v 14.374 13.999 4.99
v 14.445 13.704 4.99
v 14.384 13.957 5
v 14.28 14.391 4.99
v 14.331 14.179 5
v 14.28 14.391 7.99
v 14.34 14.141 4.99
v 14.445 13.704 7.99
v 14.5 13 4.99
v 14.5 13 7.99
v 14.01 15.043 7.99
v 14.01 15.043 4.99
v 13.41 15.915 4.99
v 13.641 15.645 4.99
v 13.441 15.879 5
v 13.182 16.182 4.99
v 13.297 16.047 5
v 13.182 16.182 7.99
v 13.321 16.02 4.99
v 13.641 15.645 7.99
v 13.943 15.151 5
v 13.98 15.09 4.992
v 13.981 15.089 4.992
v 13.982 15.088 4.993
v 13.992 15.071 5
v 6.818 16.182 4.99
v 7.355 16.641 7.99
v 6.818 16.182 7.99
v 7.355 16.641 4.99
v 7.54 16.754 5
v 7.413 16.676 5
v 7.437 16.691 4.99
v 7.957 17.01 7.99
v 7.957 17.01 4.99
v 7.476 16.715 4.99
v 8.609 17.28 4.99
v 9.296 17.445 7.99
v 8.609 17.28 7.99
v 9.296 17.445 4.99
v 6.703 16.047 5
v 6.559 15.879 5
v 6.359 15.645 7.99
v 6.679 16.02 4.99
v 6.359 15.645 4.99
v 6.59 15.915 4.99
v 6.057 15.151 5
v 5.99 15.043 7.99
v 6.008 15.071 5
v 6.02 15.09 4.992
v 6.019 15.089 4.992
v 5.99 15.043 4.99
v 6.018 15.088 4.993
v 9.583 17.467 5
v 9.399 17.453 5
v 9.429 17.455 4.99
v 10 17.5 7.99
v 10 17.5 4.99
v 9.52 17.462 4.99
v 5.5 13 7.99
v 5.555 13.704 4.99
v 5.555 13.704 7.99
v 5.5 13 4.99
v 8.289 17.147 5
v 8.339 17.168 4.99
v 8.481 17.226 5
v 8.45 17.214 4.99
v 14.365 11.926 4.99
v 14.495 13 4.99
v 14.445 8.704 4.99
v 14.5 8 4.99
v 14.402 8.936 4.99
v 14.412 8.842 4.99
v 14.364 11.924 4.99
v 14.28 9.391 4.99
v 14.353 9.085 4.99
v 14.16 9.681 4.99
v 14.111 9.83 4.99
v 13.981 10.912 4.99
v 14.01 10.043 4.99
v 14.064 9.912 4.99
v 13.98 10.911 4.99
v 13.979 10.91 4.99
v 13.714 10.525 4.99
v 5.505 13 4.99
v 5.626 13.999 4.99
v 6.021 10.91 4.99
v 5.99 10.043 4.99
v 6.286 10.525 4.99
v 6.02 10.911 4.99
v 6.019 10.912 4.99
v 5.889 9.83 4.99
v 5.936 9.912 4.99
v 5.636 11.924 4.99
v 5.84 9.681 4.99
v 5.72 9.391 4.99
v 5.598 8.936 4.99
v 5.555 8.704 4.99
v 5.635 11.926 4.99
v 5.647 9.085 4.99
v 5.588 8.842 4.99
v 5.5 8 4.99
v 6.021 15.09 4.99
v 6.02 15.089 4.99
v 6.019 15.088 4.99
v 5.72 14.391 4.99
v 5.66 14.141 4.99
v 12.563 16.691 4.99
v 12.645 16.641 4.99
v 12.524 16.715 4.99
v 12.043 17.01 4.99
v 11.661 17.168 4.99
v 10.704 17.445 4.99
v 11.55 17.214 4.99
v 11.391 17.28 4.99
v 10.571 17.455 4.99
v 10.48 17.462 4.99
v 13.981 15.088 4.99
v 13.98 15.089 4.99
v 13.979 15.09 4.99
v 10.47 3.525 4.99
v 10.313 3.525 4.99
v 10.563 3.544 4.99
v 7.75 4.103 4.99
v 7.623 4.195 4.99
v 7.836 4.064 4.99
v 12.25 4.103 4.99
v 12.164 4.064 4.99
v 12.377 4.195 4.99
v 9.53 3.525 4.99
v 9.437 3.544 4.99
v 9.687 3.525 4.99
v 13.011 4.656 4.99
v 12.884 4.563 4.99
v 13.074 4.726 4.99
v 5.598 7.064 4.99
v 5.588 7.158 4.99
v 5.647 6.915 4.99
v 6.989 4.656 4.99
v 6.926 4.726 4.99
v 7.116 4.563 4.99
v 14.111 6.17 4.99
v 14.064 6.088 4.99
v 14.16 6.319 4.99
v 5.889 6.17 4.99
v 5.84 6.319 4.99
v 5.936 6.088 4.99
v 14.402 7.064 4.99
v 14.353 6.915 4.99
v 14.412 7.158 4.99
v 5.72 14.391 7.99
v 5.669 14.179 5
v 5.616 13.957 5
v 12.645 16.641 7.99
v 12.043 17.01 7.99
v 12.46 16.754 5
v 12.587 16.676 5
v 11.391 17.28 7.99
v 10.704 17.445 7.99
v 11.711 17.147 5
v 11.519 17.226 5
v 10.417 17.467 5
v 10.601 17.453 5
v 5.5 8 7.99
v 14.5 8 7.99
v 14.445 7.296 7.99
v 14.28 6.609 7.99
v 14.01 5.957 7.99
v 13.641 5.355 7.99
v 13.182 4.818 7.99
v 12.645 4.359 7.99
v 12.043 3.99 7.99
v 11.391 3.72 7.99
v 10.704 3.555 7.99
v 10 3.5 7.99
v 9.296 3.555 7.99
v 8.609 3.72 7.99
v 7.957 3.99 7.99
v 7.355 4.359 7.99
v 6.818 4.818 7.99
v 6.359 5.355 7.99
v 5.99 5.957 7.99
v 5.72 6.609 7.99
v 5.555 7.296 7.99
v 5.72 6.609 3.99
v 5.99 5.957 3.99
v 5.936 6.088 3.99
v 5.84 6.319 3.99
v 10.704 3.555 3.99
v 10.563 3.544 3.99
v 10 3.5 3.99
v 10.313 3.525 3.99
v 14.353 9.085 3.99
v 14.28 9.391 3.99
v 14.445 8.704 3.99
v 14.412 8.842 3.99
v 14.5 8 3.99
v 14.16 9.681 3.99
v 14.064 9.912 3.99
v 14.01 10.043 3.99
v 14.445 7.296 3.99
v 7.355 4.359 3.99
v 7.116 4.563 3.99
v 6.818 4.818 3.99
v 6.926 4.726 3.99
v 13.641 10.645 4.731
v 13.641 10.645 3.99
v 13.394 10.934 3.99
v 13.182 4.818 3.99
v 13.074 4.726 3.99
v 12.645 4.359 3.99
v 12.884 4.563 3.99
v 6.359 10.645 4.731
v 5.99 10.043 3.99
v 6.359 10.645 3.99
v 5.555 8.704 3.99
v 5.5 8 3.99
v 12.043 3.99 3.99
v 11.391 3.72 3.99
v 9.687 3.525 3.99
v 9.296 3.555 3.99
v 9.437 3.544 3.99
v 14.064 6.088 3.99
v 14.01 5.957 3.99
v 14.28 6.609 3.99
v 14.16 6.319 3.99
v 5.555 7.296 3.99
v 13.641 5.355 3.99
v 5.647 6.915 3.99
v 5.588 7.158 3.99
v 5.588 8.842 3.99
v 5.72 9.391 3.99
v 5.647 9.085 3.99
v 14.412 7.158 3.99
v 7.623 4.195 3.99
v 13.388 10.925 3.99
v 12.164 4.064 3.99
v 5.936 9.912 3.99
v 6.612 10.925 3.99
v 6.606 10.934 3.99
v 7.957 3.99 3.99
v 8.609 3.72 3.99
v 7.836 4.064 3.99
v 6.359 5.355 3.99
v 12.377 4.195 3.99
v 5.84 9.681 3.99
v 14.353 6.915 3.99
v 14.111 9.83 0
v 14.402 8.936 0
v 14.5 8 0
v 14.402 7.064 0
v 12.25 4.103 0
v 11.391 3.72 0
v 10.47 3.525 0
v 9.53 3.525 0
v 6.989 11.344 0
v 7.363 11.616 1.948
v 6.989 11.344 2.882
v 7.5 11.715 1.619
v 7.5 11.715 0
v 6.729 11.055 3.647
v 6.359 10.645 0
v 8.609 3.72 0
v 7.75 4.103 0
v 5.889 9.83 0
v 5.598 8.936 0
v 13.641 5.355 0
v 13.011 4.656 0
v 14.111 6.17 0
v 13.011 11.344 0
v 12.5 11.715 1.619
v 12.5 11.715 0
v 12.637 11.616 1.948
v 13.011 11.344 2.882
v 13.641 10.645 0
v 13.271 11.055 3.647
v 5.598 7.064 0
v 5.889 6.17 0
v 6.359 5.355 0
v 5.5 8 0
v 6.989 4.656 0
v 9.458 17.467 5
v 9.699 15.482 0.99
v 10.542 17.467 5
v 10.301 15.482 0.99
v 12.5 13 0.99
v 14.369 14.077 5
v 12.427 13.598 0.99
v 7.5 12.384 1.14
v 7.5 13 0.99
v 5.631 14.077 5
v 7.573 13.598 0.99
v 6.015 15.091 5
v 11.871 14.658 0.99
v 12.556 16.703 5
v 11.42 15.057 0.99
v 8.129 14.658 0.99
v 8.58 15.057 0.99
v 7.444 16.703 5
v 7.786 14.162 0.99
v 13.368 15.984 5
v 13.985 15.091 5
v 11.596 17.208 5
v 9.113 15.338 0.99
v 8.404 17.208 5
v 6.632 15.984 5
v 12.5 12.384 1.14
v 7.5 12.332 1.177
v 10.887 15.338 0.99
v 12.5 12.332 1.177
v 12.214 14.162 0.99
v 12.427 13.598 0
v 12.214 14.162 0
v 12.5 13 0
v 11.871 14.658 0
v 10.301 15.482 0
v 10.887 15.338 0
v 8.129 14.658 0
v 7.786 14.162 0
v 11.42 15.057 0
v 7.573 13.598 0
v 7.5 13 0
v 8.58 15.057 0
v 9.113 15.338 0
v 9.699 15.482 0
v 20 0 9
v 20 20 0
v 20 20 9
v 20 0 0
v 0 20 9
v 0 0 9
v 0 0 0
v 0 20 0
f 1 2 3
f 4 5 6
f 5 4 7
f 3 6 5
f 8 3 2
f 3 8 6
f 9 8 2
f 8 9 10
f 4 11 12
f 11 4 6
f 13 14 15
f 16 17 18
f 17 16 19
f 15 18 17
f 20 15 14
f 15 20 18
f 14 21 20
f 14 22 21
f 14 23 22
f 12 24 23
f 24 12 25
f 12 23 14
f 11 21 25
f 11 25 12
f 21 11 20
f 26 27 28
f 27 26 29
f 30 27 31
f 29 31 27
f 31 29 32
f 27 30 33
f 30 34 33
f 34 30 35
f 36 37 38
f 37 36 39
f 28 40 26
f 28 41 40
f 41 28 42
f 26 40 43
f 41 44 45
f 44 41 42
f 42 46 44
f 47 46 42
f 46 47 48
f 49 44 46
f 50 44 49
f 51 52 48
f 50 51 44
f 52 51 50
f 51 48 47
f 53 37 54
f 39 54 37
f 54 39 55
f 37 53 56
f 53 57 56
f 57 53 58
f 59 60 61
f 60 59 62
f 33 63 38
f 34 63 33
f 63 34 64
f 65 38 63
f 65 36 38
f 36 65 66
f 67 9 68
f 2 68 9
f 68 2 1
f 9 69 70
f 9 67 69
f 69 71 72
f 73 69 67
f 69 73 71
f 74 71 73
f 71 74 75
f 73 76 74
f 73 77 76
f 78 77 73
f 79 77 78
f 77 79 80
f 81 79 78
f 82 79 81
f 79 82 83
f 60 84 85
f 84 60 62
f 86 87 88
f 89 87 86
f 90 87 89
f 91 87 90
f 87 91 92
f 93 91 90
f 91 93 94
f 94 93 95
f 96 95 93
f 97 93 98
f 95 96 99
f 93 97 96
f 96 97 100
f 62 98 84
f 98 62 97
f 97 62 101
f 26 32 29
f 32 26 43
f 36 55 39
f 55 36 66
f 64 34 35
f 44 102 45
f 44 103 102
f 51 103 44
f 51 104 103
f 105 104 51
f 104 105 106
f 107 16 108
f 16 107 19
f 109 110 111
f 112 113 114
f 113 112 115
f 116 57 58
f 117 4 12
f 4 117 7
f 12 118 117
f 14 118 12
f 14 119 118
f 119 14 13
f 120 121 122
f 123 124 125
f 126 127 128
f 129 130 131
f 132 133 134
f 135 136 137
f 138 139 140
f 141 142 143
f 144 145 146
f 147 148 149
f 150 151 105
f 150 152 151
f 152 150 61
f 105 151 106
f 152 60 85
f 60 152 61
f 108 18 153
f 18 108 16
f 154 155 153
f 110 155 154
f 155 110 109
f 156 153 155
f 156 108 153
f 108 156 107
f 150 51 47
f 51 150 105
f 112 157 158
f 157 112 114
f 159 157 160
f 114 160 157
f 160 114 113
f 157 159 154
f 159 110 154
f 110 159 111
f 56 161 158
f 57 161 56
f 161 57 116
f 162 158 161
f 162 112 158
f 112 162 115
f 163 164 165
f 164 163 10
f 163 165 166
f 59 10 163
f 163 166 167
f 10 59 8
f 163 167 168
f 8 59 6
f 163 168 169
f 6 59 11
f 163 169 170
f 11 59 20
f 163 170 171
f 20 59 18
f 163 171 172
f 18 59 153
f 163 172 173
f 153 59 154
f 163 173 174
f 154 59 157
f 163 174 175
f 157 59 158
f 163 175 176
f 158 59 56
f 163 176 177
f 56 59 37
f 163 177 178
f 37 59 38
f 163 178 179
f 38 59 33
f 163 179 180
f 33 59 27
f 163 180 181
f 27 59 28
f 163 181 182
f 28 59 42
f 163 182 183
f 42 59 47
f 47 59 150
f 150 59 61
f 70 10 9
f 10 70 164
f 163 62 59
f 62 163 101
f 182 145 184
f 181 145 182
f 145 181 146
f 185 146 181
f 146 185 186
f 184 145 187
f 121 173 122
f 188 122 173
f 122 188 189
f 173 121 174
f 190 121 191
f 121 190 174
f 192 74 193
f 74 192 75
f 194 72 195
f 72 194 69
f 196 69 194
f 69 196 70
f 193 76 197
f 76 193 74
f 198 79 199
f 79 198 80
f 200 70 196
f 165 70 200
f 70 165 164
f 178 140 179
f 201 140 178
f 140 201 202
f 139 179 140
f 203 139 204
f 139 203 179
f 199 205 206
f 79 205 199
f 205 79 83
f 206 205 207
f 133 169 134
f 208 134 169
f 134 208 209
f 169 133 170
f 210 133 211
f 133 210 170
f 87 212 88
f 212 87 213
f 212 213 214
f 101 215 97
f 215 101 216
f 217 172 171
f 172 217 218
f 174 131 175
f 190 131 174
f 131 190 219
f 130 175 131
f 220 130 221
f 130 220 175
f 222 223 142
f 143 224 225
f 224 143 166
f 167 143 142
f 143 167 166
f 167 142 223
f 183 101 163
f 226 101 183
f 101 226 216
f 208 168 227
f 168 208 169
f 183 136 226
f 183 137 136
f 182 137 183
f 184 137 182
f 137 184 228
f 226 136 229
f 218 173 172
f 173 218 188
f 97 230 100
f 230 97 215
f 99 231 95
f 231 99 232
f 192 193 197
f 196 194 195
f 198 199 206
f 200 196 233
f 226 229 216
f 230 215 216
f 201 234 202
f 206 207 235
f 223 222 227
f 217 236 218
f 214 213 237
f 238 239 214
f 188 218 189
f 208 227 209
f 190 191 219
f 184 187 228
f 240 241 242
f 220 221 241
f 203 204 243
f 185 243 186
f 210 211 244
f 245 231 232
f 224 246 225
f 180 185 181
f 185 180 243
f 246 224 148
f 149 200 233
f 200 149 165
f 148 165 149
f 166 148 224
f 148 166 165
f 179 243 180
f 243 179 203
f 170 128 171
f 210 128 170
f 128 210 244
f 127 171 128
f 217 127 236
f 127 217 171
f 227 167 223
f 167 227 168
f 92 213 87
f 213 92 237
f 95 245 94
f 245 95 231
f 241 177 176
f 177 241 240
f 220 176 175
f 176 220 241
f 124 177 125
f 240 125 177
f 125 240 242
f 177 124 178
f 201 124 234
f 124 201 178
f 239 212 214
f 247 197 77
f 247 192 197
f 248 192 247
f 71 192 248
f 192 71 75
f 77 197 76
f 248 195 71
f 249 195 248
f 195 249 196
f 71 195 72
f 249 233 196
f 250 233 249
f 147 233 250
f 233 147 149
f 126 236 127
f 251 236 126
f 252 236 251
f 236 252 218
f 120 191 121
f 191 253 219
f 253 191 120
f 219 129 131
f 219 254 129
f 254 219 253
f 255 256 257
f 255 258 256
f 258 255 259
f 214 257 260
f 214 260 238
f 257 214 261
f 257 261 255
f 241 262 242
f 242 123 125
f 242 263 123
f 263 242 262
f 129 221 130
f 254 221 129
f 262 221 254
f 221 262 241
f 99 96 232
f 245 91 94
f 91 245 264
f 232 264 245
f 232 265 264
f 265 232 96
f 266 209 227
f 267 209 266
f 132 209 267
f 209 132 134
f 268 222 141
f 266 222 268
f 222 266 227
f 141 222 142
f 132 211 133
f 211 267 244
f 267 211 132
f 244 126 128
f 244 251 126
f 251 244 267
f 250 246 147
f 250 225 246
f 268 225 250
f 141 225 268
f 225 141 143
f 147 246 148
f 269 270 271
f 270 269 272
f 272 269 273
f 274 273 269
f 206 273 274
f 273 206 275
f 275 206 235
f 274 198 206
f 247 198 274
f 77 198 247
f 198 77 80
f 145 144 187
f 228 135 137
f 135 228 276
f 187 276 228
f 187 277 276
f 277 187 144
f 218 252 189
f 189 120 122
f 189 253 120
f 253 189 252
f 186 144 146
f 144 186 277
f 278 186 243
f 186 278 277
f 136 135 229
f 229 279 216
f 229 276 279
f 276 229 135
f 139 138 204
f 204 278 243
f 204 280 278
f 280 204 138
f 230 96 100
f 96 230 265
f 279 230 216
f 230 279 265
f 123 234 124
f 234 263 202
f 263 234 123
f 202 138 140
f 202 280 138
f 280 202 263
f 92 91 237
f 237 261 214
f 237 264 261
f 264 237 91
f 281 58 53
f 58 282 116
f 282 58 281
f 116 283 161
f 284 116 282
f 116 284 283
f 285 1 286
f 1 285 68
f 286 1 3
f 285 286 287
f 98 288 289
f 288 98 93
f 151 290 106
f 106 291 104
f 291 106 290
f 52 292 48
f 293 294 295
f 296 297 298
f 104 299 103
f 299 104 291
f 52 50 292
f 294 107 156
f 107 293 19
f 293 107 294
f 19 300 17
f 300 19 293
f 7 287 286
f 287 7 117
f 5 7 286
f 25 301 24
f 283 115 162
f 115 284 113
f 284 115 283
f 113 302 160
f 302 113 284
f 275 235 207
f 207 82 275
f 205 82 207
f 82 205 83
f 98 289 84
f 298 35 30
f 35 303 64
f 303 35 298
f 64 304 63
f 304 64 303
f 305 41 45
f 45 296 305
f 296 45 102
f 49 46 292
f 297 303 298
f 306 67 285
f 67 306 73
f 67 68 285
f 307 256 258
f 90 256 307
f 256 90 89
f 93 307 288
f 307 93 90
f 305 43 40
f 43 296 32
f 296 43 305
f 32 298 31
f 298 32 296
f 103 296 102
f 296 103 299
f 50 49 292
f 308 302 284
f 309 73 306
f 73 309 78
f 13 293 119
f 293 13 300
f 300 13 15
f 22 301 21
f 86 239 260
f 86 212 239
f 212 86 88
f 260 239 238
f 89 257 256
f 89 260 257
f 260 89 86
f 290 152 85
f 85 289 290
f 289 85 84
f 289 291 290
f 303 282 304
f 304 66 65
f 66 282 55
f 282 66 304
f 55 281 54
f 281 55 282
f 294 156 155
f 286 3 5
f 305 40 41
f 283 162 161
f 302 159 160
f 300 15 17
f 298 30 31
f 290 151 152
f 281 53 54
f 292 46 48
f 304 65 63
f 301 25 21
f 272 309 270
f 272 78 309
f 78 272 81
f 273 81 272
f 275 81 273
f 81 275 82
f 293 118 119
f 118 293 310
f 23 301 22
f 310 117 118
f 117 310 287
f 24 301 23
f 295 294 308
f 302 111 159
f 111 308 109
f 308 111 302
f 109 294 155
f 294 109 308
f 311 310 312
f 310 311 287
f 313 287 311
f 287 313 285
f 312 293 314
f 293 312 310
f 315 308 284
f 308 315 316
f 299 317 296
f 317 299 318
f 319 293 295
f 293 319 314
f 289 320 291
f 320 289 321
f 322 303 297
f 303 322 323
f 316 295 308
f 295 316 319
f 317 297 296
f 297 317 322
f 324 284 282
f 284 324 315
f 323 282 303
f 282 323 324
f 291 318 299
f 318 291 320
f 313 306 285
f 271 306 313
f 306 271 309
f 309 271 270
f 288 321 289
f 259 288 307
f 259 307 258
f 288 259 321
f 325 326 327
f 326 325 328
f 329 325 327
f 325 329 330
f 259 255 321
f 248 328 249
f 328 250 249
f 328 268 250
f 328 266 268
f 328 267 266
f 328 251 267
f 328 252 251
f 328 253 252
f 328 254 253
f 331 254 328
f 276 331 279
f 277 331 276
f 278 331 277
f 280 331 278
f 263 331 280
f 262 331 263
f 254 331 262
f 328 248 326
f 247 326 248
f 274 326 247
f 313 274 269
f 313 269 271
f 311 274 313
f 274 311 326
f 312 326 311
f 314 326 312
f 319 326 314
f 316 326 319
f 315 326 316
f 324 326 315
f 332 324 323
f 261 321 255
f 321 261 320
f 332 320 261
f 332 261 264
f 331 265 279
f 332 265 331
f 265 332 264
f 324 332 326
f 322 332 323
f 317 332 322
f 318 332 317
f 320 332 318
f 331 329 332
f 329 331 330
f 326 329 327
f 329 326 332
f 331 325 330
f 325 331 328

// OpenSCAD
difference(){
  cube([20,20,9]);
  translate([10,8]) hanging_hook();
}
module hanging_hook() {
  translate([0,0,-.01]) {
    cylinder(d=9,h=5,$fn=30);
    translate([0,5,1]) cylinder(d1=5,d2=9,h=4.01,$fn=26);
    translate([0,5]) cylinder(d=5,h=1.01,$fn=26);
    translate([-2.5,0]) cube([5,5,5]);
    translate([0,0,4]) {
      translate([0,5,1]) cylinder(d=9,h=3,$fn=40);
      translate([-4.5,0,1]) cube([9,5,3]);
      cylinder(d=9,h=4,$fn=40);
    }
  }
}
